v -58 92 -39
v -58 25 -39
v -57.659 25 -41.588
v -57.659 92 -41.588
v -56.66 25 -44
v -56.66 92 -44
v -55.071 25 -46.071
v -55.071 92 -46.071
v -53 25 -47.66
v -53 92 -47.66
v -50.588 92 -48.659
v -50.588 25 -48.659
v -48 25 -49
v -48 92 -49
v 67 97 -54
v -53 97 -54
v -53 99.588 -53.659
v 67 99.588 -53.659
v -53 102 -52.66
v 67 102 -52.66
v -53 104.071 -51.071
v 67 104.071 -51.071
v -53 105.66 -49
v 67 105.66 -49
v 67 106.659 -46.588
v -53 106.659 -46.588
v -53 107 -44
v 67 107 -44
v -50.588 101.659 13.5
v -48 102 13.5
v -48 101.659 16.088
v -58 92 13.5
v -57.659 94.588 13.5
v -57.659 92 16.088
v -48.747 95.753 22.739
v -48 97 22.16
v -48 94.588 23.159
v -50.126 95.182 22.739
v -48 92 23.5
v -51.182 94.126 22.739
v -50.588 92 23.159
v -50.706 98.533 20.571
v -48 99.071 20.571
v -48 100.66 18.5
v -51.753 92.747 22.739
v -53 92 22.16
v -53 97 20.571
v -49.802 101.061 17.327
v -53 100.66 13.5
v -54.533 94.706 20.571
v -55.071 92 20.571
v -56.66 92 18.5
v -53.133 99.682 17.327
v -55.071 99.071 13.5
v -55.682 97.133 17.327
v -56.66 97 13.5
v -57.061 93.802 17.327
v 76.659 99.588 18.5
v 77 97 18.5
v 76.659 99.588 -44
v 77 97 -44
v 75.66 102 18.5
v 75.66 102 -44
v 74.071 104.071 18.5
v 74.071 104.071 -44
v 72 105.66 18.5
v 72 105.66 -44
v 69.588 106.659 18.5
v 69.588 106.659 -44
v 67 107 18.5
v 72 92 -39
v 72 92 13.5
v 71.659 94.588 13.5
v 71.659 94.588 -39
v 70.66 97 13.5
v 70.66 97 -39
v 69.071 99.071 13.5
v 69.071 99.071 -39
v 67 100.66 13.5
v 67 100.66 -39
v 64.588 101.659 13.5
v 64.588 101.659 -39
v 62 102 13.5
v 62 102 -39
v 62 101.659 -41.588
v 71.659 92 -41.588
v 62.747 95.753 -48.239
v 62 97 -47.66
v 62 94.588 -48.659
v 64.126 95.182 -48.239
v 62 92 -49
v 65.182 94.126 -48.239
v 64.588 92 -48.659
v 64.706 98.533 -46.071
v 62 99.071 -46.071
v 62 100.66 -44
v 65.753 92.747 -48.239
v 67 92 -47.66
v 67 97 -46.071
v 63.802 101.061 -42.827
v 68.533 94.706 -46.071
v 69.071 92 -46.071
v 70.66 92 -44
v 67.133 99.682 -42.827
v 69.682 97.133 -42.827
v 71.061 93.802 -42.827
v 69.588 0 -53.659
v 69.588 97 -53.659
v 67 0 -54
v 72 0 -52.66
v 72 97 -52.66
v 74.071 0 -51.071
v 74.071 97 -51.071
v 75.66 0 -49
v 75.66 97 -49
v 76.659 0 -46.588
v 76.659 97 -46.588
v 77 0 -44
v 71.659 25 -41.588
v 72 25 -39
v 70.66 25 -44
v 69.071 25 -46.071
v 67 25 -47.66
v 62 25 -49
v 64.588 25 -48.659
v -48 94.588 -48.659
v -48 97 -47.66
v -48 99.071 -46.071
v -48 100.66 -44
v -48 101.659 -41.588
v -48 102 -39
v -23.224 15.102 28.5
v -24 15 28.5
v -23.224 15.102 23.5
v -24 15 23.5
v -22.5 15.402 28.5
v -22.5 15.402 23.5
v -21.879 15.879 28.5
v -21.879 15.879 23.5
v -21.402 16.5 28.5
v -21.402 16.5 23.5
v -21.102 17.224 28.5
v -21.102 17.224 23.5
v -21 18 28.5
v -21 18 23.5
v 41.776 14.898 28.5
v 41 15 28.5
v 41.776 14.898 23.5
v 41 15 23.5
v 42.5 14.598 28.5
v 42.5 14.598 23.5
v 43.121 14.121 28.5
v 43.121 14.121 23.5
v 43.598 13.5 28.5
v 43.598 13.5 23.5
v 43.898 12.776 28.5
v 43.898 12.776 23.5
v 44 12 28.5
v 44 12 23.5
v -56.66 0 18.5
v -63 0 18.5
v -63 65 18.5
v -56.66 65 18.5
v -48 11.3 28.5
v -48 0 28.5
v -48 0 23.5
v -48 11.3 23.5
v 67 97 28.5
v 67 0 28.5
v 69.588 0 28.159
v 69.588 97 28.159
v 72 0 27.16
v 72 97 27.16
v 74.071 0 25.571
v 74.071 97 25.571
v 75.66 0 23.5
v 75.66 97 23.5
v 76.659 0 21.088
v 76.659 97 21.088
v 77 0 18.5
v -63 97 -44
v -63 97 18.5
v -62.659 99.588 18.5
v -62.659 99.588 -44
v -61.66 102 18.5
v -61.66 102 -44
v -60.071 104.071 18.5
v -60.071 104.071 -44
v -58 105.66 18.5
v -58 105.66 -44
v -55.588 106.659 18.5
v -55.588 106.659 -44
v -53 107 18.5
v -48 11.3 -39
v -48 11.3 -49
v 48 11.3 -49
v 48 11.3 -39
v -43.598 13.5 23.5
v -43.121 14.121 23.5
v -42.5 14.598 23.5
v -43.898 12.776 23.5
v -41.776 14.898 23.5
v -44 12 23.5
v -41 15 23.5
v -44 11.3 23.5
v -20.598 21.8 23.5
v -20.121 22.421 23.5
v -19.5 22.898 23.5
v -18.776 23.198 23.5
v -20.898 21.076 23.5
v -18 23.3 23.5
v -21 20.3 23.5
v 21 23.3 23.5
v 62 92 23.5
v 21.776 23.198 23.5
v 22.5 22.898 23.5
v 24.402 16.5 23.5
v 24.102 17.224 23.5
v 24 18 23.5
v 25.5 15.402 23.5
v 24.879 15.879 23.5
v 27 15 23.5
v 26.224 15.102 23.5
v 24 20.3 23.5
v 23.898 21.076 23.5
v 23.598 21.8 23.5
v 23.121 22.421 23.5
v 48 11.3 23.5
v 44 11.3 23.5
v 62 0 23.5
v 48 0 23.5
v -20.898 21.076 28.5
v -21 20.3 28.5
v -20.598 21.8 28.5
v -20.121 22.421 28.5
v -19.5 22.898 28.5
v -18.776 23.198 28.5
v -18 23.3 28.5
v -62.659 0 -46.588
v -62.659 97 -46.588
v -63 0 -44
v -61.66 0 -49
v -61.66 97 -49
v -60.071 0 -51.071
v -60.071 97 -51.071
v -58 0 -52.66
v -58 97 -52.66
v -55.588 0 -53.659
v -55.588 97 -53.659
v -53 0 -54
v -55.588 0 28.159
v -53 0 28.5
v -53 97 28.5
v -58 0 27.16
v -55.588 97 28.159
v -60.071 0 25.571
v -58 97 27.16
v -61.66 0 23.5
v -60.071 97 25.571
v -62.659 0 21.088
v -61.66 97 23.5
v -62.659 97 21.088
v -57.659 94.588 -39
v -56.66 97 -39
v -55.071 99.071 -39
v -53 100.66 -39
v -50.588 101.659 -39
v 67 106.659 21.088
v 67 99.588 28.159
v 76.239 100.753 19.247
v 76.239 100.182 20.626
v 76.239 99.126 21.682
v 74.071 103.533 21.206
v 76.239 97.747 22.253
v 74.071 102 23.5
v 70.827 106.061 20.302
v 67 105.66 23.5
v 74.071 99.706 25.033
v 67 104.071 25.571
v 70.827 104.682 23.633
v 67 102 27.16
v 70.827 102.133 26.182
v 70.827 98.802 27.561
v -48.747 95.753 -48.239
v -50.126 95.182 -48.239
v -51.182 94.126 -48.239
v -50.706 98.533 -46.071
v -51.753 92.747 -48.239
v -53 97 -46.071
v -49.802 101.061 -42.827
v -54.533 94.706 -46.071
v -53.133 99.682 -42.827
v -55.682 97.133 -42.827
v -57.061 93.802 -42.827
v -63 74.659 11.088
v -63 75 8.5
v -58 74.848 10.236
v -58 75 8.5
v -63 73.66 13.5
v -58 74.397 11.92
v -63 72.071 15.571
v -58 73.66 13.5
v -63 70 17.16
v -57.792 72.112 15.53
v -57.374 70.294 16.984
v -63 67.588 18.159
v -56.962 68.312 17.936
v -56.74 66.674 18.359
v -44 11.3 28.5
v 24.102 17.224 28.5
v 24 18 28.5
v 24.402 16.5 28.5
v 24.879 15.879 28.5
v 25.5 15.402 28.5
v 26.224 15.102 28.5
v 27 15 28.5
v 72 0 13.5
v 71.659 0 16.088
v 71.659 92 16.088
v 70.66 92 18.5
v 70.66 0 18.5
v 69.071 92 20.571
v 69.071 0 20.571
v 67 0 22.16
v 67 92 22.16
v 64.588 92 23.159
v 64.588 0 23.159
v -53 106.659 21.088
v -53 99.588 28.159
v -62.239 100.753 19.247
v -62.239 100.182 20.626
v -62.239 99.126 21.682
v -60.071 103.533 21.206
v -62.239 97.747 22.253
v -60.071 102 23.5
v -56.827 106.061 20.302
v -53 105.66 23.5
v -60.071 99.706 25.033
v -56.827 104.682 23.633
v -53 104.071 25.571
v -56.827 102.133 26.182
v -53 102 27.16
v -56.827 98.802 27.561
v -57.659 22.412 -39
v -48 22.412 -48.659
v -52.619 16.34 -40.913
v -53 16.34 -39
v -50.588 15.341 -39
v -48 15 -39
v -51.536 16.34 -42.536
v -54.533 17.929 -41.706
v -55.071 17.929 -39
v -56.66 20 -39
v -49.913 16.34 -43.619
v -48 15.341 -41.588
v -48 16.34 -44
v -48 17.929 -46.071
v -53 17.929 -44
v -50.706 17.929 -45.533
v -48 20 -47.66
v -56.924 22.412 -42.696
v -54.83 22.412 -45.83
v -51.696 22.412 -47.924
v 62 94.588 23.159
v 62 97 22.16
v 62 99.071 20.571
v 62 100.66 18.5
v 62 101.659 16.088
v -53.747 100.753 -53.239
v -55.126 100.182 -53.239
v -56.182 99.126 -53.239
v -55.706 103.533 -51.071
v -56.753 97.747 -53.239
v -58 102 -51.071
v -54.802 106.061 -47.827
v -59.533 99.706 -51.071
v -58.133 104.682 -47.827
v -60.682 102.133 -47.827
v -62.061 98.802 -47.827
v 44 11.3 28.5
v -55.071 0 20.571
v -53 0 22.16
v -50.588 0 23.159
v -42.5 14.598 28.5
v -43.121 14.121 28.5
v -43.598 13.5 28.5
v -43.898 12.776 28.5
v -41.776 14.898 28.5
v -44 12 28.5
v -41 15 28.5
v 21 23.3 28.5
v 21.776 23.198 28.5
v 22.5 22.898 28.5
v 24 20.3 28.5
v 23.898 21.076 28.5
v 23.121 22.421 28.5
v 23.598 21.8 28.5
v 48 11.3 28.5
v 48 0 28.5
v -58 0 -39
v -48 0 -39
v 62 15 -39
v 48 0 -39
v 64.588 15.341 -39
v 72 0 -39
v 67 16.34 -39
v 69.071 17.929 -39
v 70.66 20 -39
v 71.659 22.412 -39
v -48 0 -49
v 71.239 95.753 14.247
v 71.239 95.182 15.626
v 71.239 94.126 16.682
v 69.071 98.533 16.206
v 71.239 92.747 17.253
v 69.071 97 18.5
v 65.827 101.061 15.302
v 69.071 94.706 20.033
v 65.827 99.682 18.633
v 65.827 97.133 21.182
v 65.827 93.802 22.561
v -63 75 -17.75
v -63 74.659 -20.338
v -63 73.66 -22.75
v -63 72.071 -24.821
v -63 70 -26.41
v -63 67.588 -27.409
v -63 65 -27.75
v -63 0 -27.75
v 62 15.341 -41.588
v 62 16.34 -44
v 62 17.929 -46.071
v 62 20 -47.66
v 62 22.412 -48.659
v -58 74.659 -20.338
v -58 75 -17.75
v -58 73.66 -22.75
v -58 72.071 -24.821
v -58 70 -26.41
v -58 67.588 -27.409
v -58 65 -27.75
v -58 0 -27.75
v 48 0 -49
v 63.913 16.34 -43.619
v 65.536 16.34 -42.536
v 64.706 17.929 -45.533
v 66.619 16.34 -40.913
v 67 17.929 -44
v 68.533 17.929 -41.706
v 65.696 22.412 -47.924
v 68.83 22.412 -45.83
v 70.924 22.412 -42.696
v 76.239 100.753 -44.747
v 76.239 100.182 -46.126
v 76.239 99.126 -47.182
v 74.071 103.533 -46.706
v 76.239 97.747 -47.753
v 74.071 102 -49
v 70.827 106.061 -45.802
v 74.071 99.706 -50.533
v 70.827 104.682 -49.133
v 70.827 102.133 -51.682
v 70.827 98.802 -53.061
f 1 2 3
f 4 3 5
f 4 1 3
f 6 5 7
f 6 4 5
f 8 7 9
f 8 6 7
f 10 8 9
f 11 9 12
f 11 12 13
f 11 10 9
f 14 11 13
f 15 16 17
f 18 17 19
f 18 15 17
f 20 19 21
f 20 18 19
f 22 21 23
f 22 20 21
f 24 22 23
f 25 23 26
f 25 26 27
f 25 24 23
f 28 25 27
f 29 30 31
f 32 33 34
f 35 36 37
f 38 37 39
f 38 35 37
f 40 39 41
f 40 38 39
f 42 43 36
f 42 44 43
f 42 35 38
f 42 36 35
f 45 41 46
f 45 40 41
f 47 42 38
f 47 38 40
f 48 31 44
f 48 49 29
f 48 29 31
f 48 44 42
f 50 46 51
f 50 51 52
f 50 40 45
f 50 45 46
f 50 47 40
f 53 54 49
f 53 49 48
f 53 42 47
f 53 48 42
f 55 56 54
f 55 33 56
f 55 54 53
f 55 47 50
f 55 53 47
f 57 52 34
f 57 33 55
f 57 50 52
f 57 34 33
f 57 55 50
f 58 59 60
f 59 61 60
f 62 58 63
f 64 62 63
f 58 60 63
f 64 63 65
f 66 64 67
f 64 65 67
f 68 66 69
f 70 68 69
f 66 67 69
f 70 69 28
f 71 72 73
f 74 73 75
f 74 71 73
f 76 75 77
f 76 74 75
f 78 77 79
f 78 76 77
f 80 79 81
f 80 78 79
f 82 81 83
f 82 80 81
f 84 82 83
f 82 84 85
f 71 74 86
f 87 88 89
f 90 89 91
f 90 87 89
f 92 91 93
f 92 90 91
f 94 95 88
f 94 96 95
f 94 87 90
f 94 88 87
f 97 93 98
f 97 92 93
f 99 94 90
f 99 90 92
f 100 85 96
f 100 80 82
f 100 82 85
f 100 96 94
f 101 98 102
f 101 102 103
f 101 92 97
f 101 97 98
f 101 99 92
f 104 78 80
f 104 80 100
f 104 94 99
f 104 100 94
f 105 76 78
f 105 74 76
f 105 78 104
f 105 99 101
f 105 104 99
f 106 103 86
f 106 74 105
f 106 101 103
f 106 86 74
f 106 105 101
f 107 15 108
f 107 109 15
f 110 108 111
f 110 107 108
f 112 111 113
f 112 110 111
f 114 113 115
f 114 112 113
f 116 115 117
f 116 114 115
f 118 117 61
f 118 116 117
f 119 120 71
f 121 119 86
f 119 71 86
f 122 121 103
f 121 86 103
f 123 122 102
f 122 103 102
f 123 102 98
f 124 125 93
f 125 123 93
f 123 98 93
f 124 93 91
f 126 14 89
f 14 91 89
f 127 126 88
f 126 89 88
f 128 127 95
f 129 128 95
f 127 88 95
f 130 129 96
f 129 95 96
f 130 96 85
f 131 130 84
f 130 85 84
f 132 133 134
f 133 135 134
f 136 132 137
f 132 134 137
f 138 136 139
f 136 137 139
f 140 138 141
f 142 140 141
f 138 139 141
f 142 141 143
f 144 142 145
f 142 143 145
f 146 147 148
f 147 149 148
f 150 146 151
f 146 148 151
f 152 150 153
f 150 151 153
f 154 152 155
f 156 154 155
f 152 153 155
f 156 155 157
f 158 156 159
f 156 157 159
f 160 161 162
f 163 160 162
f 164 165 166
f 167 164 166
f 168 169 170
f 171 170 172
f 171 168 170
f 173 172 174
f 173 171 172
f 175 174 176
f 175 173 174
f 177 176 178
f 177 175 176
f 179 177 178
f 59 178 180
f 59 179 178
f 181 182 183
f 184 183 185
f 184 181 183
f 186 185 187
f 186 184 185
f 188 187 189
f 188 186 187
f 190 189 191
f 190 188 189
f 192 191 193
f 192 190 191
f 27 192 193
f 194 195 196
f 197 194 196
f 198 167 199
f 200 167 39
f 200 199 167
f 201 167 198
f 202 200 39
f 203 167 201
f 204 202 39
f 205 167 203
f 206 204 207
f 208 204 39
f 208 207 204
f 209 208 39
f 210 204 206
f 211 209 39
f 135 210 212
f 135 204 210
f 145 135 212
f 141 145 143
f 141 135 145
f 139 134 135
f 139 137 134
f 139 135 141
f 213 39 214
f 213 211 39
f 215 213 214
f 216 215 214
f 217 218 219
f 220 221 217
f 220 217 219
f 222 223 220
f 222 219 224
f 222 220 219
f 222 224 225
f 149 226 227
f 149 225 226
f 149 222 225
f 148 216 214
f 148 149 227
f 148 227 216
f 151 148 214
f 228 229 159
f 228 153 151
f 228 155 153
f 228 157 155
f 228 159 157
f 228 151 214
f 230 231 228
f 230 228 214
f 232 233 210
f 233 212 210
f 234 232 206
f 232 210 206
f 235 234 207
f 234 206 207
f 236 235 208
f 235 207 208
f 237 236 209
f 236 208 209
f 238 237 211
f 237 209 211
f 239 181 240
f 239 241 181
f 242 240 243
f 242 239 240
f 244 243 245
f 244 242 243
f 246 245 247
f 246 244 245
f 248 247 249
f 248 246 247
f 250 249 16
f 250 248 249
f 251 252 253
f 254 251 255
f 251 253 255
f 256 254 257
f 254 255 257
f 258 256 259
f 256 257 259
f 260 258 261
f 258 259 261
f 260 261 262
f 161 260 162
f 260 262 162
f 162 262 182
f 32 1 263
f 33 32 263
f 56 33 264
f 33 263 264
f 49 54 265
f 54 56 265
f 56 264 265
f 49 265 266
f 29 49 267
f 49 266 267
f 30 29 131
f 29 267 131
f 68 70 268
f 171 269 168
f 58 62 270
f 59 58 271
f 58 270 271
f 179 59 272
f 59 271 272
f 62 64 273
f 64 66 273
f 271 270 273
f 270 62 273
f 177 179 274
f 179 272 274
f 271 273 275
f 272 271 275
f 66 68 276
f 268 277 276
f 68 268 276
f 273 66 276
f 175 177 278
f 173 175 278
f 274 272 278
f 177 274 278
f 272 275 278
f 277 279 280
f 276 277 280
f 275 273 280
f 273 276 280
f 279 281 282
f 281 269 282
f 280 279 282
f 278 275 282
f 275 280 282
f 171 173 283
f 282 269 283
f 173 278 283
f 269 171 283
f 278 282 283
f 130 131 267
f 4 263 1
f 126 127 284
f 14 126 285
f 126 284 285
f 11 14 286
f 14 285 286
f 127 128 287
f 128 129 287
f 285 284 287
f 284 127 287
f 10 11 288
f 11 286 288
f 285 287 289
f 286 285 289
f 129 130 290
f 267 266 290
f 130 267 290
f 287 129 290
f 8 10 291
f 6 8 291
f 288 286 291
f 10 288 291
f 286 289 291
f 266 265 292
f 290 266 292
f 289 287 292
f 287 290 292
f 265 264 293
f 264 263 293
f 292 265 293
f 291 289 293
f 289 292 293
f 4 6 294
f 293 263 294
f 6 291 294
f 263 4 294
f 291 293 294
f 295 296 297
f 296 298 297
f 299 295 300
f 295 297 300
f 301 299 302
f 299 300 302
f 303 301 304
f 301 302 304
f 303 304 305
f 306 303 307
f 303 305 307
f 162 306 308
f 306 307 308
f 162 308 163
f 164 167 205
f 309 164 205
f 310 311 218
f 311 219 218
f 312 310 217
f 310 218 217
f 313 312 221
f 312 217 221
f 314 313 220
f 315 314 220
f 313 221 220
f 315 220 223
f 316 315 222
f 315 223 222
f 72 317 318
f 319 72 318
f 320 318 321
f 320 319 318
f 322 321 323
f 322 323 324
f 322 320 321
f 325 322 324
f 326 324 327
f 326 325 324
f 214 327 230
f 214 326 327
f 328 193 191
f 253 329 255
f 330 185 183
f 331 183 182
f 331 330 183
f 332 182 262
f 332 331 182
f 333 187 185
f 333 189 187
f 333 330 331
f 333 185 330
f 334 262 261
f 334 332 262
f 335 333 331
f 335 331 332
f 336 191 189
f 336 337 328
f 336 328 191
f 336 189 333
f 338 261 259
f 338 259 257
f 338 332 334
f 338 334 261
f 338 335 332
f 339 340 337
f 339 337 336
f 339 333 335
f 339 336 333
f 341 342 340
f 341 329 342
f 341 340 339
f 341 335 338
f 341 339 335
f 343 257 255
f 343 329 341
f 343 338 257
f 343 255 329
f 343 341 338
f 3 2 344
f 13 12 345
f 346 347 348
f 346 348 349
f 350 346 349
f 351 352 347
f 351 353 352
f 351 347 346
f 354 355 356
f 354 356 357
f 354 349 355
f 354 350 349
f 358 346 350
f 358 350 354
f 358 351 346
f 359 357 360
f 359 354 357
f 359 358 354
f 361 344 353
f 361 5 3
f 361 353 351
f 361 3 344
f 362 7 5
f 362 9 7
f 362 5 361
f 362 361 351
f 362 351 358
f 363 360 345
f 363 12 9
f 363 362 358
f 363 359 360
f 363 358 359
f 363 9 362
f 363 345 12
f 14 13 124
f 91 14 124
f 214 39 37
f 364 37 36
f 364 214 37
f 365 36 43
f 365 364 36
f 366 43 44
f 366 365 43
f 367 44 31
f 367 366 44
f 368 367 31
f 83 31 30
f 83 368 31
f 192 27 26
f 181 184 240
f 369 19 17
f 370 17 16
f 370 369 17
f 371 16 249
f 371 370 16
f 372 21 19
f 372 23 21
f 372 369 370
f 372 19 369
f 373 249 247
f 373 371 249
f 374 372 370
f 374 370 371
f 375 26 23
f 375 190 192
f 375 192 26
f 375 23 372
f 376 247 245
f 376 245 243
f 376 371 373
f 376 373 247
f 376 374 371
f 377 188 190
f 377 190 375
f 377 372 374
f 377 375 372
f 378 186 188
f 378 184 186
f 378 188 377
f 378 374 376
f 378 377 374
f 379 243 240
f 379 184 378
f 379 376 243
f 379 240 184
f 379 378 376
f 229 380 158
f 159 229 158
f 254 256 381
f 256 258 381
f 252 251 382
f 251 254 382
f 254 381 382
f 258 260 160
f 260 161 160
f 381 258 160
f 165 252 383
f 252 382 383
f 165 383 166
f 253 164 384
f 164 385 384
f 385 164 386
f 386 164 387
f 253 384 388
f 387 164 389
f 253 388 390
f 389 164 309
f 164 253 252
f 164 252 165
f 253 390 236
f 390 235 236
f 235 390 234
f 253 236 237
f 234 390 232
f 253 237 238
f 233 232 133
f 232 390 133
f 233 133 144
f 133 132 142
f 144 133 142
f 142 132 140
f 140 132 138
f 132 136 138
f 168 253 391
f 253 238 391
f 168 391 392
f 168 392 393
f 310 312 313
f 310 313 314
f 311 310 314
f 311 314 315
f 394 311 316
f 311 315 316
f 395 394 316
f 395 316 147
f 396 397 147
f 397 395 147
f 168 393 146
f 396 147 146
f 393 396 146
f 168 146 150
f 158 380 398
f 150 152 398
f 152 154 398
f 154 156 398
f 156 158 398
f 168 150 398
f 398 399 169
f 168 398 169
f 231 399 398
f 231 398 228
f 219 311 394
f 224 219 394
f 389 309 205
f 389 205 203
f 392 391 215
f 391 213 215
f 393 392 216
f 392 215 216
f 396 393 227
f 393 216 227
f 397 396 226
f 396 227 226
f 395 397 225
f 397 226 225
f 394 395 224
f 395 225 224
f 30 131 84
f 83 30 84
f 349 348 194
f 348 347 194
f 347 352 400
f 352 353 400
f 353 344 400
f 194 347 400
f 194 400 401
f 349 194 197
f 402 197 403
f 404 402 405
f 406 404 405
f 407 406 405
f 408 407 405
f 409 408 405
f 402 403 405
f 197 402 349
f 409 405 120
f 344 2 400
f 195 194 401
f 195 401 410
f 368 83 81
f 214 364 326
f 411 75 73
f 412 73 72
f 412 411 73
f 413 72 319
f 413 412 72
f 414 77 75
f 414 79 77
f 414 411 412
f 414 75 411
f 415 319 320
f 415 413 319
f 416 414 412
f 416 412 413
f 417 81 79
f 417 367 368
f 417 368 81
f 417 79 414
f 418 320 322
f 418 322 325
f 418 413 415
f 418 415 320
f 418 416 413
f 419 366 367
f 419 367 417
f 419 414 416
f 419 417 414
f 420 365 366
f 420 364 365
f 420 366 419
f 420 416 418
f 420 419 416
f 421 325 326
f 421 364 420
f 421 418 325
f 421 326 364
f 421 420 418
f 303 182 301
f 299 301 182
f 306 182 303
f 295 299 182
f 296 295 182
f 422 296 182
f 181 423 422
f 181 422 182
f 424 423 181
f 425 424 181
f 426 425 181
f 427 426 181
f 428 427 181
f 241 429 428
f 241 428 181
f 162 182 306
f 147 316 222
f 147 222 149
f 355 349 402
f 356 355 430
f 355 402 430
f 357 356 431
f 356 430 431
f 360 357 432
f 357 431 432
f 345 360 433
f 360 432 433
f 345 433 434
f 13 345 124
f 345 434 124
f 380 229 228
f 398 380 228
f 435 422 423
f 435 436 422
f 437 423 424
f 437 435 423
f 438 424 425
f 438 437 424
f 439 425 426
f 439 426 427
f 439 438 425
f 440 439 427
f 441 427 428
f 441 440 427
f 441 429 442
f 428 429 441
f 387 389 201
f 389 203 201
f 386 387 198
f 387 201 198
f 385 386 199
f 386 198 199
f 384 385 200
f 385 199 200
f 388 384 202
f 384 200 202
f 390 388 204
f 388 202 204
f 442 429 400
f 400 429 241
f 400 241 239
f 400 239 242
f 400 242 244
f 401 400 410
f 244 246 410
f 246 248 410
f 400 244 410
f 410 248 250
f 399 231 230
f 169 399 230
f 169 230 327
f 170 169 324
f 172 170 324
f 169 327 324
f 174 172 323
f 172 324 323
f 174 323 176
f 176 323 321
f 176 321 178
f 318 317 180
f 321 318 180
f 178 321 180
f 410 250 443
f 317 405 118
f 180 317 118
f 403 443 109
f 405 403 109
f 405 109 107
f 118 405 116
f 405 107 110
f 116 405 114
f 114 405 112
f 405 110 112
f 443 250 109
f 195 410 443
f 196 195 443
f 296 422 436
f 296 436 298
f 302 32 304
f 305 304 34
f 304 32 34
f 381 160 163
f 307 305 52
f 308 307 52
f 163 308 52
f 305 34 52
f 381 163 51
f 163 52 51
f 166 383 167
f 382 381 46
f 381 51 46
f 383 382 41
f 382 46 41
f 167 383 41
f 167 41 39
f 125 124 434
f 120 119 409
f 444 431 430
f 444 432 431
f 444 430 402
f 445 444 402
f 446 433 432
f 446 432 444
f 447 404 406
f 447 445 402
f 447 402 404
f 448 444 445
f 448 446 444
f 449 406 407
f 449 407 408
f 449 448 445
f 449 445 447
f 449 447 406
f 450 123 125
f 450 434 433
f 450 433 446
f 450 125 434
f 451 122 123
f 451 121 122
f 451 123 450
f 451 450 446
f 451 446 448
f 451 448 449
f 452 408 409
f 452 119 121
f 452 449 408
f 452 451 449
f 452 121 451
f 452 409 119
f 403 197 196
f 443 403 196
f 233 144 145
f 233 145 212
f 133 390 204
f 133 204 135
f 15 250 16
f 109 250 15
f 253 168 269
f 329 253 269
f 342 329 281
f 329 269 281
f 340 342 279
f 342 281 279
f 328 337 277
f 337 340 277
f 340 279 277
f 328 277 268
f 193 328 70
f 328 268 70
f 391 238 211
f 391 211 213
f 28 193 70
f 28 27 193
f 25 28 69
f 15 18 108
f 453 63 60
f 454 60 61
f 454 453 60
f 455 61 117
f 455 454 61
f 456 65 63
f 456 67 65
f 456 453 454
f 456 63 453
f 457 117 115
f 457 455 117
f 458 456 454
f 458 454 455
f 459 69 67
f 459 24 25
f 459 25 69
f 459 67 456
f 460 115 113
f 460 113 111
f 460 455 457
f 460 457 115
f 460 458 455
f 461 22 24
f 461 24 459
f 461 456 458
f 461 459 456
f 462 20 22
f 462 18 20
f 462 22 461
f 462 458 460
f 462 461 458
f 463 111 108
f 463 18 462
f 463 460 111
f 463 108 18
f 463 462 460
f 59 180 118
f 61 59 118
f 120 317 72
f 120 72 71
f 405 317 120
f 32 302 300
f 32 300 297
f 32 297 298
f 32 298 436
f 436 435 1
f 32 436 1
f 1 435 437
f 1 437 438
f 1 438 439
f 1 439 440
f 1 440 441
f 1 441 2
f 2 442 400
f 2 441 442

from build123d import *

# Parameters (mm, degrees)
SKETCH1_W           = 140
SKETCH1_H           = 82.5
SKETCH1_W_2         = 130
SKETCH1_H_2         = 72.5
BOSS_EXTRUDE1_DEPTH = 102
BOSS_EXTRUDE2_START = 102
SKETCH1_3_W         = 140
SKETCH1_3_H         = 82.5
BOSS_EXTRUDE2_DEPTH = 5
SKETCH1_4_W         = 96
SKETCH1_4_H         = 82.405729741
BOSS_EXTRUDE4_DEPTH = 11.3
SKETCH1_5_W         = 130
SKETCH1_5_H         = 10
EXTRUDE_THIN3_DEPTH = 15
CUT_EXTRUDE2_REACH  = 157.513
SKETCH2_W           = 88
SKETCH2_H           = 15
FILLET1_R           = 10
FILLET2_R           = 10
CUT_EXTRUDE3_REACH  = 186.296
SKETCH3_W           = 46.25
SKETCH3_H           = 75
FILLET3_R           = 10
CUT_EXTRUDE4_REACH  = 157.513
SKETCH4_W           = 45
SKETCH4_H           = 12
FILLET4_R           = 3


with BuildPart() as part:
    # Sketch1 → Boss-Extrude1 (new body)
    with BuildSketch(Plane(origin=(0, 0, 0), x_dir=(1, 0, 0), z_dir=(0, 1, 0))):
        with Locations((7, 12.75)):
            Rectangle(SKETCH1_W, SKETCH1_H)
        with Locations((7, 12.75)):
            Rectangle(SKETCH1_W_2, SKETCH1_H_2, mode=Mode.SUBTRACT)
    extrude(amount=BOSS_EXTRUDE1_DEPTH)

    # Sketch1<3> → Boss-Extrude2 (add)
    with BuildSketch(Plane(origin=(0, 0, 0), x_dir=(1, 0, 0), z_dir=(0, 1, 0)).offset(BOSS_EXTRUDE2_START)):
        with Locations((7, 12.75)):
            Rectangle(SKETCH1_3_W, SKETCH1_3_H)
    extrude(amount=BOSS_EXTRUDE2_DEPTH)

    # Sketch1<5> → Extrude-Thin3 (add)
    with BuildSketch(Plane(origin=(0, 0, 0), x_dir=(1, 0, 0), z_dir=(0, 1, 0))):
        with Locations((7, 44)):
            Rectangle(SKETCH1_5_W, SKETCH1_5_H)
    extrude(amount=EXTRUDE_THIN3_DEPTH)


with BuildPart() as body_2:
    # Sketch1<4> → Boss-Extrude4 (new body)
    with BuildSketch(Plane(origin=(0, 0, 0), x_dir=(1, 0, 0), z_dir=(0, 1, 0))):
        with Locations((0, 7.797135129)):
            Rectangle(SKETCH1_4_W, SKETCH1_4_H)
    extrude(amount=BOSS_EXTRUDE4_DEPTH)


with BuildPart() as part_1:
    add(part.part)

    # Combine1: cut body 2
    add(body_2.part, mode=Mode.SUBTRACT)

    # Sketch2 → Cut-Extrude2 (cut, up to next)
    with BuildSketch(Plane.XY.offset(28.5), mode=Mode.PRIVATE) as cut_extrude2_sk1:
        with Locations((0, 7.5)):
            Rectangle(SKETCH2_W, SKETCH2_H)
    cut_extrude2_tool1 = extrude(cut_extrude2_sk1.sketch, amount=-CUT_EXTRUDE2_REACH, mode=Mode.PRIVATE) & part_1.part
    add(cut_extrude2_tool1.solids().sort_by_distance((0, 7.5, 28.5))[0], mode=Mode.SUBTRACT)

    # Fillet1
    fillet1_edges = [part_1.edges().sort_by_distance(p)[0] for p in [
        (-58, 102, -12.75),
        (7, 102, 23.5),
        (72, 102, -12.75),
        (7, 102, -49),
        (7, 107, 28.5),
        (-63, 107, -12.75),
        (7, 107, -54),
        (77, 107, -12.75),
        (-58, 58.5, -49),
        (72, 58.5, -49),
        (72, 51, 23.5),
        (-58, 51, 23.5),
        (-63, 53.5, 28.5),
        (-63, 53.5, -54),
        (77, 53.5, -54),
        (77, 53.5, 28.5),
    ]]
    fillet(fillet1_edges, radius=FILLET1_R)

    # Fillet2
    fillet2_edges = [part_1.edges().sort_by_distance(p)[0] for p in [
        (7, 15, -49),
        (69.071067812, 15, -46.071067812),
        (-55.071067812, 15, -46.071067812),
    ]]
    fillet(fillet2_edges, radius=FILLET2_R - 0.0001)  # a hair under: the kernel refuses the full size

    # Sketch3 → Cut-Extrude3 (cut, up to next)
    with BuildSketch(Plane.ZY.offset(63), mode=Mode.PRIVATE) as cut_extrude3_sk1:
        with Locations((-4.625, 37.5)):
            Rectangle(SKETCH3_W, SKETCH3_H)
    cut_extrude3_tool1 = extrude(cut_extrude3_sk1.sketch, amount=-CUT_EXTRUDE3_REACH, mode=Mode.PRIVATE) & part_1.part
    add(cut_extrude3_tool1.solids().sort_by_distance((-63, 37.5, -4.625))[0], mode=Mode.SUBTRACT)

    # Fillet3
    fillet3_edges = [part_1.edges().sort_by_distance(p)[0] for p in [
        (-59.830127019, 75, 18.5),
        (-60.5, 75, -27.75),
    ]]
    fillet(fillet3_edges, radius=FILLET3_R)

    # Sketch4 → Cut-Extrude4 (cut, up to next)
    with BuildSketch(Plane.XY.offset(28.5), mode=Mode.PRIVATE) as cut_extrude4_sk1:
        with Locations((1.5, 17.3)):
            Rectangle(SKETCH4_W, SKETCH4_H)
    cut_extrude4_tool1 = extrude(cut_extrude4_sk1.sketch, amount=-CUT_EXTRUDE4_REACH, mode=Mode.PRIVATE) & part_1.part
    add(cut_extrude4_tool1.solids().sort_by_distance((1.5, 17.3, 28.5))[0], mode=Mode.SUBTRACT)

    # Fillet4
    fillet4_edges = [part_1.edges().sort_by_distance(p)[0] for p in [
        (44, 15, 26),
        (-44, 15, 26),
        (24, 15, 26),
        (24, 23.3, 26),
        (-21, 23.3, 26),
        (-21, 15, 26),
    ]]
    fillet(fillet4_edges, radius=FILLET4_R)


solid = part_1.part
